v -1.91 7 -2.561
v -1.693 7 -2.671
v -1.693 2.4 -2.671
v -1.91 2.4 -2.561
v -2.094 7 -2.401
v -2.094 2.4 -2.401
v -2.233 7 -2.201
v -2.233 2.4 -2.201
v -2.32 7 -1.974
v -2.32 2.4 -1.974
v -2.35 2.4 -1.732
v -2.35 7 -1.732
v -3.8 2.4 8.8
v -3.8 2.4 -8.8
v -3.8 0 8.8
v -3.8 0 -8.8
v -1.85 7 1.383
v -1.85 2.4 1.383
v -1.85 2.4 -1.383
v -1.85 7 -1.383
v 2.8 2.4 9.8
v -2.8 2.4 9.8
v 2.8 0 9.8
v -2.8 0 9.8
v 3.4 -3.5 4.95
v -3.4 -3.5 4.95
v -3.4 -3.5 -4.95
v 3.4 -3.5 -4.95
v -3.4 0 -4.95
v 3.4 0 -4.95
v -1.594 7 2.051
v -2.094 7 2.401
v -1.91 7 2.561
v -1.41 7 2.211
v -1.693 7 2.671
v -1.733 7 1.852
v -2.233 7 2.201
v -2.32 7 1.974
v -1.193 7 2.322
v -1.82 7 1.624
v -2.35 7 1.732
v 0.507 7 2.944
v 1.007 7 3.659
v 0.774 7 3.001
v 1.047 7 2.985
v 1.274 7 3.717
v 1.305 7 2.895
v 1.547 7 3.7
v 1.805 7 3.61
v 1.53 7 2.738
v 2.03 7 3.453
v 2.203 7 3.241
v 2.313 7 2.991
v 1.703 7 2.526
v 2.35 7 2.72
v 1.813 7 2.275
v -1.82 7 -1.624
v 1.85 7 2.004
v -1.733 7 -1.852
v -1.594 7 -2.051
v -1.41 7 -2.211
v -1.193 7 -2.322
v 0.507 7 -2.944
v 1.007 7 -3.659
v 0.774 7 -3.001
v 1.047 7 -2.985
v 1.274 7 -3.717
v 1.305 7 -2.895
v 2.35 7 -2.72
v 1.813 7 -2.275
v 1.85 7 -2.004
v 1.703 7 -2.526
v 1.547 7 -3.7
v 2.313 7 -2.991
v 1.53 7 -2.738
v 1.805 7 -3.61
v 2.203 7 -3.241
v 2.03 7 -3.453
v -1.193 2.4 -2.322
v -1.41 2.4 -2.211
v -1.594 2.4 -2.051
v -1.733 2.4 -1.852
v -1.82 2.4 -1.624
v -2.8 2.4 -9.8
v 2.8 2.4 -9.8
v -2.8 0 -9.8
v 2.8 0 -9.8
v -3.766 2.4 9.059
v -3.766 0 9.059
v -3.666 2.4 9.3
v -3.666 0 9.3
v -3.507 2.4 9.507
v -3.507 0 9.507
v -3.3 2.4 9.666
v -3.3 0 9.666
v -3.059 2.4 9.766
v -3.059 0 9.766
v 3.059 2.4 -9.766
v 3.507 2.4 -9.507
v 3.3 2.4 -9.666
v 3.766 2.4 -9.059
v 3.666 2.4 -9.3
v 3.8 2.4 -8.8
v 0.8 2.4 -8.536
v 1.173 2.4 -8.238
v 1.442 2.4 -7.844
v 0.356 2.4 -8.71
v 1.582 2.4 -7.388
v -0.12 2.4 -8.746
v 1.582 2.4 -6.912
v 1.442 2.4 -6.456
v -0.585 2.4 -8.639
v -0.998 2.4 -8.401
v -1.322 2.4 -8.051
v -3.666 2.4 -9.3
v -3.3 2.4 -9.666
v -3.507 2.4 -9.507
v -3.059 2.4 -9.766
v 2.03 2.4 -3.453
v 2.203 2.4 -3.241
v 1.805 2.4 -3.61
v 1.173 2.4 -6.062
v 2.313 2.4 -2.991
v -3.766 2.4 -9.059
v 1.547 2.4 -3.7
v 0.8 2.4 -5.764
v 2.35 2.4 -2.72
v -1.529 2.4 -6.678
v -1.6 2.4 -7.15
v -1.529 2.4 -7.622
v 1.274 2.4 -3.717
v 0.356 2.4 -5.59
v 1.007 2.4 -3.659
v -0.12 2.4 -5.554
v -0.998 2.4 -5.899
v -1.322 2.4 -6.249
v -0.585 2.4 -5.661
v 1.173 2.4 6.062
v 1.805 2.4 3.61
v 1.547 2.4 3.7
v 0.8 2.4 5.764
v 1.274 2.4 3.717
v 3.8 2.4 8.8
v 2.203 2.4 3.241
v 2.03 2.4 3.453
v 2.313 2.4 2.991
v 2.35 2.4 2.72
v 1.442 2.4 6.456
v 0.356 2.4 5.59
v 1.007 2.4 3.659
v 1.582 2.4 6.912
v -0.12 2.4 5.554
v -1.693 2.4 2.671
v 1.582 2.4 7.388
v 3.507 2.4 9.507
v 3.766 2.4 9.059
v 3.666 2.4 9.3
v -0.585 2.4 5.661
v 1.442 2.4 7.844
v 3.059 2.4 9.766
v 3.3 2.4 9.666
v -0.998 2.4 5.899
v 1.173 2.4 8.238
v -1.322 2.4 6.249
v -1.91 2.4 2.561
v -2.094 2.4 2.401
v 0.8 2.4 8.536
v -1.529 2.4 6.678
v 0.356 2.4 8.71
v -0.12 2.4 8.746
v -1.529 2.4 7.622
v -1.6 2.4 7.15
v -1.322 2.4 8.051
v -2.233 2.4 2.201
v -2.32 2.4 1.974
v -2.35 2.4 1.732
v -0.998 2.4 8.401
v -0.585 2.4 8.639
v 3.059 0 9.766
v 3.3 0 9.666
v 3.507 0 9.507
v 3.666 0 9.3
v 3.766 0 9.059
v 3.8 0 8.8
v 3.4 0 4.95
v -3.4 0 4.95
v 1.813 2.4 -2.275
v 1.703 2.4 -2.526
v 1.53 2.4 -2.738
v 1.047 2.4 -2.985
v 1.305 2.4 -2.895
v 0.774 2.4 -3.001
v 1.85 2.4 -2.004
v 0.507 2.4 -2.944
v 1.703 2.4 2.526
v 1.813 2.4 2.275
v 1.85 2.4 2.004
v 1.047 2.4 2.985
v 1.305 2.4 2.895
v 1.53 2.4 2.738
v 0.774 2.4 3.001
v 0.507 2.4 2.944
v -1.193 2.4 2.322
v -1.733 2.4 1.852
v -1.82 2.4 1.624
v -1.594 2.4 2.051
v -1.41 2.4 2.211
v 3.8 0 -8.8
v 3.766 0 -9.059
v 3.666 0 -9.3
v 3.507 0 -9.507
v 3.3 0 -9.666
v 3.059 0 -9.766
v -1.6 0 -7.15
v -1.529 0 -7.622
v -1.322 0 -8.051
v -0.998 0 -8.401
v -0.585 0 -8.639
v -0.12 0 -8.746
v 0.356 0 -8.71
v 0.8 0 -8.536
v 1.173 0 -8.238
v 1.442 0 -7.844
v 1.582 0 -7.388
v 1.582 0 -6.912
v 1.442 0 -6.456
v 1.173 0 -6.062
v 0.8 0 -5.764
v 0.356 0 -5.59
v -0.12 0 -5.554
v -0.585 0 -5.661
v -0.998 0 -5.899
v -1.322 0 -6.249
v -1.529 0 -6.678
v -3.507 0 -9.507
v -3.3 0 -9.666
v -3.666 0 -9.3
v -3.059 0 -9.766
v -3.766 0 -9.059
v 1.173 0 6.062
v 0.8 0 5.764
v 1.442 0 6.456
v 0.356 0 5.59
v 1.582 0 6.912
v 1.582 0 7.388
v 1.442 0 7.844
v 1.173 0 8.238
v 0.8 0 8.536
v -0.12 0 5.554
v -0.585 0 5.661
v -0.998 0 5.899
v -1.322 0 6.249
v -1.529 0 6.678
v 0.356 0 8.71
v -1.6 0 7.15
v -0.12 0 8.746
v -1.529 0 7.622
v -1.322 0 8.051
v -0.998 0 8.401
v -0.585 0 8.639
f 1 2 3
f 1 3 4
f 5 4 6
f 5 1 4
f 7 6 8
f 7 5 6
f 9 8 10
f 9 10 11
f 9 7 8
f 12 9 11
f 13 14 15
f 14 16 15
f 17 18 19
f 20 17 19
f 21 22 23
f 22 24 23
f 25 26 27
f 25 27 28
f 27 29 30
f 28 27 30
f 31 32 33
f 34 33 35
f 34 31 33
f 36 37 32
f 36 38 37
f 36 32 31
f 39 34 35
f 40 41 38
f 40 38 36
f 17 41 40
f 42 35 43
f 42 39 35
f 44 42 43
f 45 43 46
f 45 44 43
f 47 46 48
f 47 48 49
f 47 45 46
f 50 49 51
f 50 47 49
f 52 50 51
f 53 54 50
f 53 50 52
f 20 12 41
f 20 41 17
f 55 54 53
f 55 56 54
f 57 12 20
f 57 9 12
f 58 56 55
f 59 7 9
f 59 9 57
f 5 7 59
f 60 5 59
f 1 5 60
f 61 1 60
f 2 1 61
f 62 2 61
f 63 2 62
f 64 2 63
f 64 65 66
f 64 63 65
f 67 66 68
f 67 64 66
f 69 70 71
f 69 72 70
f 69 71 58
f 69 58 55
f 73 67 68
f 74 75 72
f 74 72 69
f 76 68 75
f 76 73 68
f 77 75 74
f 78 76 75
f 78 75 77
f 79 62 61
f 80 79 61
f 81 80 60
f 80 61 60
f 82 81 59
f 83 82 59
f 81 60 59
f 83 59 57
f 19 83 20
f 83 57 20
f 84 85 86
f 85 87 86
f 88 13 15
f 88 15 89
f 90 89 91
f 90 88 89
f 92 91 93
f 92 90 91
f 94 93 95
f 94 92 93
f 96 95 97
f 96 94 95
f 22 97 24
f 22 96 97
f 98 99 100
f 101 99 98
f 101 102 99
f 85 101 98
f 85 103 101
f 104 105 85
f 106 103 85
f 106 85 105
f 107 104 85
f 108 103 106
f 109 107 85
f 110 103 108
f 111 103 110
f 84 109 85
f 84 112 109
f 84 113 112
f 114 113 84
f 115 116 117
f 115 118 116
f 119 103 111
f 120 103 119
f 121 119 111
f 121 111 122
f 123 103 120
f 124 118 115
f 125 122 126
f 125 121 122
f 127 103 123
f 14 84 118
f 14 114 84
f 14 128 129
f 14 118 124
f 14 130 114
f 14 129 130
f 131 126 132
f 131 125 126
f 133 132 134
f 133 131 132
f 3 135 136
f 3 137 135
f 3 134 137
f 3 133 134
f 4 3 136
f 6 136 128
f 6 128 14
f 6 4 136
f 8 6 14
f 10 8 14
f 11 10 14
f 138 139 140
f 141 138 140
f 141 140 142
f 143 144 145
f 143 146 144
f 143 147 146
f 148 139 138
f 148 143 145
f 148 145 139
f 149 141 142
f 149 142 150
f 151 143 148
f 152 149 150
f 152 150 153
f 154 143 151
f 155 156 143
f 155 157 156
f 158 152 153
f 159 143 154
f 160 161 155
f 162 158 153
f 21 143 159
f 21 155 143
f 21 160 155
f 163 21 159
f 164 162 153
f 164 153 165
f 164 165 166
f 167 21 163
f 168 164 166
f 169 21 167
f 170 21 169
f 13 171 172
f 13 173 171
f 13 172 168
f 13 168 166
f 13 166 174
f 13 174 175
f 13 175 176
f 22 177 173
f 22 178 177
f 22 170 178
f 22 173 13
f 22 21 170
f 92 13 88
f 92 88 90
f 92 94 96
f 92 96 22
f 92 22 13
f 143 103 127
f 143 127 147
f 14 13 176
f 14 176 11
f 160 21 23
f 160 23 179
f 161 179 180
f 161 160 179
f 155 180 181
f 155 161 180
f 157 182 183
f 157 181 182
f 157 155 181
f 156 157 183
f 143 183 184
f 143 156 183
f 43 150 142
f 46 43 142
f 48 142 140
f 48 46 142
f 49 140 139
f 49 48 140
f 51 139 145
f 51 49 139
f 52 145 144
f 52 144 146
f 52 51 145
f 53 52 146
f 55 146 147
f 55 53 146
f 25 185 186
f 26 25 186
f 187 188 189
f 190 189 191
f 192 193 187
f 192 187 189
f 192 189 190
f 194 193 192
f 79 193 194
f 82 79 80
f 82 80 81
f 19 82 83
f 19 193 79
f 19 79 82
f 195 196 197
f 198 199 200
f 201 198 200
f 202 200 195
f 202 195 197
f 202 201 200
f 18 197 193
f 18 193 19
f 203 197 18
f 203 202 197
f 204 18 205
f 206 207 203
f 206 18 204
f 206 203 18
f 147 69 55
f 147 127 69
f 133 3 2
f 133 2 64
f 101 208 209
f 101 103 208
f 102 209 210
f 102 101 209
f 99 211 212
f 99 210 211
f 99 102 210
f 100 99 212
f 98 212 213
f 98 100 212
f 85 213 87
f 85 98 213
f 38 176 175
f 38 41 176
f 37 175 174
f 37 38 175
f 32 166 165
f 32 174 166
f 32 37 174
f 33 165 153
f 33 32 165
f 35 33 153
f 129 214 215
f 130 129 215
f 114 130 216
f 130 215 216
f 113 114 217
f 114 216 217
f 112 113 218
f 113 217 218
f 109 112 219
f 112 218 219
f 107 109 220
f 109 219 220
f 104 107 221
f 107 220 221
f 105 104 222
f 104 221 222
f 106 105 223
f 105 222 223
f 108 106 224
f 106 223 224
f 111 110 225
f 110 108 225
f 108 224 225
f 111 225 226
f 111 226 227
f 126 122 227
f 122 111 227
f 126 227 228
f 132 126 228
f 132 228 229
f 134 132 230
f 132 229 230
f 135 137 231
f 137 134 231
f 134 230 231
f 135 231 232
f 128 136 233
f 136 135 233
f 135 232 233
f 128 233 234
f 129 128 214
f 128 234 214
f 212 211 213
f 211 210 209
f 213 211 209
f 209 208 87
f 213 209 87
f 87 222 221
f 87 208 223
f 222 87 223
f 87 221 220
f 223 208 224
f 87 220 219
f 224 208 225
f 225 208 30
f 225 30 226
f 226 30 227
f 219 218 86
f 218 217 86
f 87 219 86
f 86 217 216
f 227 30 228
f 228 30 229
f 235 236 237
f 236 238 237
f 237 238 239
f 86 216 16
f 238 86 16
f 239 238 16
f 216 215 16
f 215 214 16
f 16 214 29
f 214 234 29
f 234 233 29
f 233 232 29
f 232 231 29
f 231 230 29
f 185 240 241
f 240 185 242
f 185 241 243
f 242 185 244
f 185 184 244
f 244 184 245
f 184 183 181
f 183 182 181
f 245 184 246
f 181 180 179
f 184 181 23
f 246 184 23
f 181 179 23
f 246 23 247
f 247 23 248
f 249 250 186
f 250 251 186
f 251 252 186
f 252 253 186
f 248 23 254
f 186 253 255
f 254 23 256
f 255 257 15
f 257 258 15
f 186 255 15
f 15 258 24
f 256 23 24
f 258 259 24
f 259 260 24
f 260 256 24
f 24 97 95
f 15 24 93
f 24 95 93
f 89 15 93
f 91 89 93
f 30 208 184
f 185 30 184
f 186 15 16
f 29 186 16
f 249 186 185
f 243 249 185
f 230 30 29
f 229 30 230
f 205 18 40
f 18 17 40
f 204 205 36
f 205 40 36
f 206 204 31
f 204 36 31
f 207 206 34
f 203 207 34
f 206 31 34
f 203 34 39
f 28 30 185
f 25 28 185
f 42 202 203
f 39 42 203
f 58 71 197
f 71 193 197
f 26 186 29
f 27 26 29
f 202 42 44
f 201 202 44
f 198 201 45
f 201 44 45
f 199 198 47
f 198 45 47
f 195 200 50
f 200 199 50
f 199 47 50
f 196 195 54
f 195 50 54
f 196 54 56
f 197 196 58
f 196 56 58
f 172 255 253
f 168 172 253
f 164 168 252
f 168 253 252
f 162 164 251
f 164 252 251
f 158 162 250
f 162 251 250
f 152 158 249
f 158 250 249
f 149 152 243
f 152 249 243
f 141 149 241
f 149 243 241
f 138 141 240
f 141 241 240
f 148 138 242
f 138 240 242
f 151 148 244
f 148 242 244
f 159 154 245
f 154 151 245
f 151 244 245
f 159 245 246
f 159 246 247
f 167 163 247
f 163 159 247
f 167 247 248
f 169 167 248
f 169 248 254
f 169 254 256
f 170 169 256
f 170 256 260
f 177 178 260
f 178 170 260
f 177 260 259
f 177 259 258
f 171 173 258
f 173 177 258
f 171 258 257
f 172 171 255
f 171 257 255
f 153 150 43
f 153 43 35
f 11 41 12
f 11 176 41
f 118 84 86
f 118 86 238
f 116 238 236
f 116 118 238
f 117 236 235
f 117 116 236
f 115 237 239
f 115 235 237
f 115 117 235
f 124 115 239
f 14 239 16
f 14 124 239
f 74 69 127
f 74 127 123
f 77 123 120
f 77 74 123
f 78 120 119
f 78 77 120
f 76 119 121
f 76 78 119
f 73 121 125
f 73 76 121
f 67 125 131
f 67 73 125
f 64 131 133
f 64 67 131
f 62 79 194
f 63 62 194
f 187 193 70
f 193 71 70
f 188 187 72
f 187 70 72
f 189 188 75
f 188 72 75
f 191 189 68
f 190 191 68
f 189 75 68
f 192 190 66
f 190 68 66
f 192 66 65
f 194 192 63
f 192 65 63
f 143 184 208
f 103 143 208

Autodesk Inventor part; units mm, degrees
ref_plane "YZ Plane" through (0, 0, 0) normal (1, 0, 0) x (0, 1, 0)
ref_plane "XZ Plane" through (0, 0, 0) normal (0, 1, 0) x (-1, 0, 0)
ref_plane "XY Plane" through (0, 0, 0) normal (0, 0, 1) x (1, 0, 0)
sketch "Sketch1" plane through (0, 0, 0) normal (0, 1, 0) x (-1, 0, 0)
  line L0 (3.8, 9.8) -> (-3.8, 9.8)
  line L1 (-3.8, 9.8) -> (-3.8, -9.8)
  line L2 (-3.8, -9.8) -> (3.8, -9.8)
  line L3 (3.8, -9.8) -> (3.8, 9.8)
  circle A0 centre (0, 7.15) radius 1.6
  circle A1 centre (0, -7.15) radius 1.6
  point P0 (0, 0)
  dimension "d0" = 19.6
  dimension "d1" = 7.6
  dimension "d2" = 9.8
  dimension "d3" = 3.8
  dimension "d4" = 3.2
  dimension "d5" = 3.2
  dimension "d6" = 14.3
  dimension "d7" = 7.15
extrude "Extrusion1" add sketch "Sketch1" along normal blind 2.4
fillet "Fillet1" radius 1 4 edges at (3.8, 1.2, 9.8) (-3.8, 1.2, 9.8) (3.8, 1.2, -9.8) (-3.8, 1.2, -9.8)
sketch "Sketch2" plane through (0, 2.4, 0) normal (0, 1, 0) x (1, 0, 0)
  line L0 (-2.35, -2.4313) -> (-2.35, 2.4313)
  line L1 (-2.35, 2.4313) -> (2.35, 4.15)
  line L2 (2.35, 4.15) -> (2.35, -4.15)
  line L3 (2.35, -4.15) -> (-2.35, -2.4313)
  line L4 (1.85, -3.4348) -> (-1.85, -2.0818)
  line L5 (-1.85, -2.0818) -> (-1.85, 2.0818)
  line L6 (-1.85, 2.0818) -> (1.85, 3.4348)
  line L7 (1.85, 3.4348) -> (1.85, -3.4348)
  point P0 (0, 0)
  dimension "d11" = 69.914
  dimension "d13" = 8.3
  dimension "d14" = 4.7
  dimension "d15" = 2.35
  dimension "d17" = 0.5
  dimension "d18" = 0.5
  dimension "d19" = 0.5
  dimension "d20" = 0.5
  dimension "d21" = 4.15
  dimension "d22" = 69.914
  dimension "d23" = 69.914
extrude "Extrusion2" add sketch "Sketch2" along normal blind 4.6
fillet "Fillet2" radius 1 8 edges at (-2.35, 4.7, -2.4313) (-2.35, 4.7, 2.4313) (2.35, 4.7, 4.15) (2.35, 4.7, -4.15) (-1.85, 4.7, -2.0818) (-1.85, 4.7, 2.0818) (1.85, 4.7, -3.4348) (1.85, 4.7, 3.4348)
sketch "Sketch3" plane through (0, 0, 0) normal (0, -1, 0) x (1, 0, 0)
  line L0 (3.4, 4.95) -> (-3.4, 4.95)
  line L1 (-3.4, 4.95) -> (-3.4, -4.95)
  line L2 (-3.4, -4.95) -> (3.4, -4.95)
  line L3 (3.4, -4.95) -> (3.4, 4.95)
  point P0 (0, 0)
  dimension "d27" = 9.9
  dimension "d28" = 6.8
  dimension "d29" = 4.95
  dimension "d30" = 3.4
extrude "Extrusion3" add sketch "Sketch3" along normal blind 3.5
equation "\"d2\" = 0.5 * d0"
equation "\"d3\" = 0.5 * d1"
equation "\"d5\" = d4"
equation "\"d7\" = 0.5 * d6"
equation "\"d15\" = 0.5 * d14"
equation "\"d21\" = 0.5 * d13"
equation "\"d22\" = d11"
equation "\"d29\" = 0.5 * d27"
equation "\"d30\" = 0.5 * d28"
properties part number "9pin male connector"
